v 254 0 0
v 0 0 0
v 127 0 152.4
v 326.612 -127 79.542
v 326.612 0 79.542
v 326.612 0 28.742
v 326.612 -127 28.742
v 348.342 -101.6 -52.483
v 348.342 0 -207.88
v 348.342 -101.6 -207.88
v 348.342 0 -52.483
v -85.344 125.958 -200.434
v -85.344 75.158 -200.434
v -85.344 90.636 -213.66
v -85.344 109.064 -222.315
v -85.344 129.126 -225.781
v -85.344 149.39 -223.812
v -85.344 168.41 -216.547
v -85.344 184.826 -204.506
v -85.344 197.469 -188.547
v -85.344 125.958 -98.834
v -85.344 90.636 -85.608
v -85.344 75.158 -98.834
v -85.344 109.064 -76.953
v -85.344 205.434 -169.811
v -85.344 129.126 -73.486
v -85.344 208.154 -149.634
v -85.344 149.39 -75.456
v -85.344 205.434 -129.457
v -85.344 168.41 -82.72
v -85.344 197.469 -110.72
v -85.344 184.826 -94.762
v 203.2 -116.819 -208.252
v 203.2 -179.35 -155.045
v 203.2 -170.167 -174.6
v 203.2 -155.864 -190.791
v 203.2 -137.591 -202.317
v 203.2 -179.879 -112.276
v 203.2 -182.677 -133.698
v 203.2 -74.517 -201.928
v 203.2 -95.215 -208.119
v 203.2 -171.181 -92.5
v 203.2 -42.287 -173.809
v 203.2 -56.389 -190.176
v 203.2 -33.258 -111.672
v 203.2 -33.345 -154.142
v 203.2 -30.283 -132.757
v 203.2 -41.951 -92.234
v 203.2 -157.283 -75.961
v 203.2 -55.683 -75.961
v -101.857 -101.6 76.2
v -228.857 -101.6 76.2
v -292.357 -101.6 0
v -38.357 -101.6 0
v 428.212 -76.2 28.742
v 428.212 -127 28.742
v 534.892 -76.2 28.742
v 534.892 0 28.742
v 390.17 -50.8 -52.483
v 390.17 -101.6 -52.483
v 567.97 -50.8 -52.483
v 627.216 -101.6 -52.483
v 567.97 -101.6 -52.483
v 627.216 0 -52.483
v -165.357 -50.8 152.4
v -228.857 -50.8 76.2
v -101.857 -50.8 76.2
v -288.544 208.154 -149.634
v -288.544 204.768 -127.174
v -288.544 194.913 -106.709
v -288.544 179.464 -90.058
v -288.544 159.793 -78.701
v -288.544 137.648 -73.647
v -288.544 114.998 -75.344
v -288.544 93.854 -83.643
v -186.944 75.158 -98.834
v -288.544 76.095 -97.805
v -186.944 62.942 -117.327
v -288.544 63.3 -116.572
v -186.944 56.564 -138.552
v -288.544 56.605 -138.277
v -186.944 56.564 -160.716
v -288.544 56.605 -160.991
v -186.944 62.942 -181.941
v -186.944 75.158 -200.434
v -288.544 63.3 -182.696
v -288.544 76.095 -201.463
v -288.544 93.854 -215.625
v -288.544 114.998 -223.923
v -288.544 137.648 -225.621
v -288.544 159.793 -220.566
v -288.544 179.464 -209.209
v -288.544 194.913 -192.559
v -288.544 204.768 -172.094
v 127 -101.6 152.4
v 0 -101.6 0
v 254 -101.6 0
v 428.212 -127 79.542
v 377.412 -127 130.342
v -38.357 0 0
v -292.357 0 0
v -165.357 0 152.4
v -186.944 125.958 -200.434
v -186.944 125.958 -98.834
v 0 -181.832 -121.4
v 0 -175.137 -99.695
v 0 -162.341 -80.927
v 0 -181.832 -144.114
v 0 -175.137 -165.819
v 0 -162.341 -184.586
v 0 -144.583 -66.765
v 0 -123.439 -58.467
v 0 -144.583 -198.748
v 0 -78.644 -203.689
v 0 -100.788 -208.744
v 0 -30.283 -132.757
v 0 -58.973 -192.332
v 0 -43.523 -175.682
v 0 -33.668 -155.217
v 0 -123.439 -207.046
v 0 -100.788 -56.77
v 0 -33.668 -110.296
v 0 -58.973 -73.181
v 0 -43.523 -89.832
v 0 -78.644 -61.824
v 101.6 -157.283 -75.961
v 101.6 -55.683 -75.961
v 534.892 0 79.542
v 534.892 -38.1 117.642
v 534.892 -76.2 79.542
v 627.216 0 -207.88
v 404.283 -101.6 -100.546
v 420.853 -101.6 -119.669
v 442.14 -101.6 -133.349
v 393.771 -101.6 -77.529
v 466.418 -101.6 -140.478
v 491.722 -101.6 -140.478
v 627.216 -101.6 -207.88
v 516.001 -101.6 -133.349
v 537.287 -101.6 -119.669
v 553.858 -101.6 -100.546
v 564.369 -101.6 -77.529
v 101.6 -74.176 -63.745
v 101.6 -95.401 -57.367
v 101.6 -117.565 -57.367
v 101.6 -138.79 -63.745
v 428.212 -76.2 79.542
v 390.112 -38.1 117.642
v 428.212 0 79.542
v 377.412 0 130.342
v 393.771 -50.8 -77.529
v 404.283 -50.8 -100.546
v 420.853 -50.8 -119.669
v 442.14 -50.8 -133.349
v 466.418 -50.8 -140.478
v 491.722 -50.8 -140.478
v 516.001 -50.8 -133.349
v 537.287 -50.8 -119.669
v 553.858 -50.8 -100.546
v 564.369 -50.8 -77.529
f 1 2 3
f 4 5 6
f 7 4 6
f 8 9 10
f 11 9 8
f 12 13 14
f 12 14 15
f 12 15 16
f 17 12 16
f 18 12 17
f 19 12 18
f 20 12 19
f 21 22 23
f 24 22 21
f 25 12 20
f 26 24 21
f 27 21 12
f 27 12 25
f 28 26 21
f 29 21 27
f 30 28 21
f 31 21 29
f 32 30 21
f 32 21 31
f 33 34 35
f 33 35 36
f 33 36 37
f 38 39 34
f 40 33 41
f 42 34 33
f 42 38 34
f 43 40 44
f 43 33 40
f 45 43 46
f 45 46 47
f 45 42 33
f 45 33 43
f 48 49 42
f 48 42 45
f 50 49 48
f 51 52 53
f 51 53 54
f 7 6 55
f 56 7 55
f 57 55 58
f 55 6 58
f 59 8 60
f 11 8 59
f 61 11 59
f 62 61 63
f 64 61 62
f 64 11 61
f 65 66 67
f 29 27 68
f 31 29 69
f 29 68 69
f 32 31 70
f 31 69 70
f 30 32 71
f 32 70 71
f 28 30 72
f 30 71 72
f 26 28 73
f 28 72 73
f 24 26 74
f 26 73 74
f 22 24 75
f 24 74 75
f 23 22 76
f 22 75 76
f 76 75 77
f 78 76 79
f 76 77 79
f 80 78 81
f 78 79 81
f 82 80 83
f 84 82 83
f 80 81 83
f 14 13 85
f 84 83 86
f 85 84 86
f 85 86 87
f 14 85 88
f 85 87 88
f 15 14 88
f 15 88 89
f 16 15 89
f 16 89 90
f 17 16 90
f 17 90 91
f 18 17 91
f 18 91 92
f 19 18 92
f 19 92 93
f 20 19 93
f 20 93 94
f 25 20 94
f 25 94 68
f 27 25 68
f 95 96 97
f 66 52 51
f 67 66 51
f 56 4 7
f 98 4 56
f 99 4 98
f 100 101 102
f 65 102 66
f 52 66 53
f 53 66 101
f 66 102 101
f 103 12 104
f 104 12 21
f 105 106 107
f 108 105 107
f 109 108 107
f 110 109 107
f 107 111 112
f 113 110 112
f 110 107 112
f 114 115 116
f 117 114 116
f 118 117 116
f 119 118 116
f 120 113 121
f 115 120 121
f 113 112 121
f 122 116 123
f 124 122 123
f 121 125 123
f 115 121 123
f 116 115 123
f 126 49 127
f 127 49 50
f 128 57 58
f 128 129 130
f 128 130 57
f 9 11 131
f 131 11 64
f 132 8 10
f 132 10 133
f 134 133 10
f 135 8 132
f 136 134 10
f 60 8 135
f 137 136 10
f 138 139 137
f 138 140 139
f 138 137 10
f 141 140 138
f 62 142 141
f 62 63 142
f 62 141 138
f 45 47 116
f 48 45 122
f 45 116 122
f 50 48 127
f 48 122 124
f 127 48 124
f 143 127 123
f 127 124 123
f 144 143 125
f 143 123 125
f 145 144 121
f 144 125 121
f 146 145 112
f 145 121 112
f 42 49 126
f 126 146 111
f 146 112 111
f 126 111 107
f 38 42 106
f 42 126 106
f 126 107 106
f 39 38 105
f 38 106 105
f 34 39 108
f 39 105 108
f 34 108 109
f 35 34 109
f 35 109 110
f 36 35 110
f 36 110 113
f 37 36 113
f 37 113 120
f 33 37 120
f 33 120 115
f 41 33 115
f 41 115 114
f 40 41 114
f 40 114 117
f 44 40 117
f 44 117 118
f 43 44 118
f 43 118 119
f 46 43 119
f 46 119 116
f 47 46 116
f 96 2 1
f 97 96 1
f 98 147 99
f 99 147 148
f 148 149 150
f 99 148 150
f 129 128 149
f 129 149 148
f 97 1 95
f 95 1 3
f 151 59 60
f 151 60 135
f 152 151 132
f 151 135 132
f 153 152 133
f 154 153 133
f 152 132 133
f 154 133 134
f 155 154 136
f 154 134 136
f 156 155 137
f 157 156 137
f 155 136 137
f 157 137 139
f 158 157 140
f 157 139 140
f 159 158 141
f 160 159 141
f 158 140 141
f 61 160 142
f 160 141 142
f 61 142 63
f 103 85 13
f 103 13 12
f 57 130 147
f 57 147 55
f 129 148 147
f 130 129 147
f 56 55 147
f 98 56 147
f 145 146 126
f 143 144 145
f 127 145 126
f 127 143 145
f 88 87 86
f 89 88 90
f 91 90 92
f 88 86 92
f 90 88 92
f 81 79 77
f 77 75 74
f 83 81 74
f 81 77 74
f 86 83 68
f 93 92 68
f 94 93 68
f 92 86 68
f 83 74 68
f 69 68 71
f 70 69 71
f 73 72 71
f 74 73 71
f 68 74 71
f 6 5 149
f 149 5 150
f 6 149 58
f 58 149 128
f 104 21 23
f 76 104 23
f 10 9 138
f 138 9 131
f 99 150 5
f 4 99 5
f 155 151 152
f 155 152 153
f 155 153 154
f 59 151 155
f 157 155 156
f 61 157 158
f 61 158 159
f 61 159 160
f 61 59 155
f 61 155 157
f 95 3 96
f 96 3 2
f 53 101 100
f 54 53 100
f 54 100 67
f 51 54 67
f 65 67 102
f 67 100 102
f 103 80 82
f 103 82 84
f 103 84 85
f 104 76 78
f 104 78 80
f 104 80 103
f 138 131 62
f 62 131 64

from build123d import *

# Parameters (mm, degrees)
F1_DEPTH  = 101.6
F3_DEPTH  = 50.8
F5_DEPTH  = 101.6
F7_DEPTH  = 127
F8_DEPTH  = 127
F12_R     = 76.2
F13_DEPTH = 203.2
F15_DEPTH = 101.6
F17_R     = 76.2
F18_DEPTH = 203.2
F20_DEPTH = 101.6
F21_W     = 278.8744270802
F21_H     = 155.3969010711
F22_DEPTH = 101.6
F24_DEPTH = 50.8


with BuildPart() as f1:
    # F0 (on Front) → F1 (new body)
    with BuildSketch(Plane.XZ):
        Polygon((-165.3565709478, 152.4), (-292.3565709478, 0), (-38.3565709478, 0), align=None)
    extrude(amount=F1_DEPTH)

    # F2 (on face) → F3 (cut)
    with BuildSketch(Plane.XZ.offset(101.6)):
        Polygon((-165.3565709478, 152.4), (-228.8565709478, 76.2), (-101.8565709478, 76.2), align=None)
    extrude(amount=-F3_DEPTH, mode=Mode.SUBTRACT)


with BuildPart() as f5:
    # F4 (on Front) → F5 (new body)
    with BuildSketch(Plane.XZ):
        Polygon((127, 152.4), (0, 0), (254, 0), align=None)
    extrude(amount=F5_DEPTH)


with BuildPart() as f7:
    # F6 (on Front) → F7 (new body)
    with BuildSketch(Plane.XZ):
        Polygon((326.6123191833, 79.5415978638), (326.6123191833, 28.7415978638), (428.2123191833, 28.7415978638), (428.2123191833, 79.5415978638), (377.4123191833, 130.3415978638), align=None)
    extrude(amount=F7_DEPTH)

    # F6 (on Front) → F8 (join)
    with BuildSketch(Plane.XZ):
        Polygon((326.6123191833, 79.5415978638), (326.6123191833, 28.7415978638), (428.2123191833, 28.7415978638), (428.2123191833, 79.5415978638), (377.4123191833, 130.3415978638), align=None)
    extrude(amount=F8_DEPTH)

    # F10 (on offset) → F11 (join, up to the next surface of F7)
    with BuildSketch(Plane.YZ.offset(534.8923191833)):
        Polygon((-76.2, 28.7415978638), (0, 28.7415978638), (0, 79.5415978638), (-38.1, 117.6415978638), (-76.2, 79.5415978638), align=None)
    extrude(until=Until.NEXT, dir=(-1, 0, 0))


with BuildPart() as f13:
    # F12 (on Right) → F13 (new body)
    with BuildSketch(Plane.YZ):
        with Locations((-106.4828932285, -132.7566355467)):
            Circle(F12_R)
    extrude(amount=F13_DEPTH)

    # F14 (on face) → F15 (cut)
    with BuildSketch(Plane.YZ.offset(203.2)):
        with BuildLine():
            ThreePointArc((-55.6828932285, -75.9605089182), (-106.4828932285, -56.5566355467), (-157.2828932285, -75.9605089182))
            Line((-157.2828932285, -75.9605089182), (-55.6828932285, -75.9605089182))
        make_face()
    extrude(amount=-F15_DEPTH, mode=Mode.SUBTRACT)


with BuildPart() as f18:
    # F17 (on offset) → F18 (new body)
    with BuildSketch(Plane.YZ.offset(-288.544)):
        with Locations((131.9538205862, -149.6339142323)):
            Circle(F17_R)
    extrude(amount=F18_DEPTH)

    # F19 (on face) → F20 (cut)
    with BuildSketch(Plane.YZ.offset(-85.344)):
        with BuildLine():
            Line((125.9576939577, -98.8339142323), (75.1576939577, -98.8339142323))
            ThreePointArc((75.1576939577, -98.8339142323), (55.7538205862, -149.6339142323), (75.1576939577, -200.4339142323))
            Line((75.1576939577, -200.4339142323), (125.9576939577, -200.4339142323))
            Line((125.9576939577, -200.4339142323), (125.9576939577, -98.8339142323))
        make_face()
    extrude(amount=-F20_DEPTH, mode=Mode.SUBTRACT)


with BuildPart() as f22:
    # F21 (on Front) → F22 (new body)
    with BuildSketch(Plane.XZ):
        with Locations((487.779006362, -130.1811523736)):
            Rectangle(F21_W, F21_H)
    extrude(amount=F22_DEPTH)

    # F23 (on face) → F24 (cut)
    with BuildSketch(Plane.XZ.offset(101.6)):
        with BuildLine():
            ThreePointArc((390.1701270103, -52.482701838), (479.0701270103, -141.382701838), (567.9701270103, -52.482701838))
            Line((567.9701270103, -52.482701838), (390.1701270103, -52.482701838))
        make_face()
        with BuildLine():
            Line((390.1701270103, -52.482701838), (567.9701270103, -52.482701838))
            ThreePointArc((567.9701270103, -52.482701838), (479.0701270103, 36.417298162), (390.1701270103, -52.482701838))
        make_face()
    extrude(amount=-F24_DEPTH, mode=Mode.SUBTRACT)


solid = Compound([f1.part, f5.part, f7.part, f13.part, f18.part, f22.part])
